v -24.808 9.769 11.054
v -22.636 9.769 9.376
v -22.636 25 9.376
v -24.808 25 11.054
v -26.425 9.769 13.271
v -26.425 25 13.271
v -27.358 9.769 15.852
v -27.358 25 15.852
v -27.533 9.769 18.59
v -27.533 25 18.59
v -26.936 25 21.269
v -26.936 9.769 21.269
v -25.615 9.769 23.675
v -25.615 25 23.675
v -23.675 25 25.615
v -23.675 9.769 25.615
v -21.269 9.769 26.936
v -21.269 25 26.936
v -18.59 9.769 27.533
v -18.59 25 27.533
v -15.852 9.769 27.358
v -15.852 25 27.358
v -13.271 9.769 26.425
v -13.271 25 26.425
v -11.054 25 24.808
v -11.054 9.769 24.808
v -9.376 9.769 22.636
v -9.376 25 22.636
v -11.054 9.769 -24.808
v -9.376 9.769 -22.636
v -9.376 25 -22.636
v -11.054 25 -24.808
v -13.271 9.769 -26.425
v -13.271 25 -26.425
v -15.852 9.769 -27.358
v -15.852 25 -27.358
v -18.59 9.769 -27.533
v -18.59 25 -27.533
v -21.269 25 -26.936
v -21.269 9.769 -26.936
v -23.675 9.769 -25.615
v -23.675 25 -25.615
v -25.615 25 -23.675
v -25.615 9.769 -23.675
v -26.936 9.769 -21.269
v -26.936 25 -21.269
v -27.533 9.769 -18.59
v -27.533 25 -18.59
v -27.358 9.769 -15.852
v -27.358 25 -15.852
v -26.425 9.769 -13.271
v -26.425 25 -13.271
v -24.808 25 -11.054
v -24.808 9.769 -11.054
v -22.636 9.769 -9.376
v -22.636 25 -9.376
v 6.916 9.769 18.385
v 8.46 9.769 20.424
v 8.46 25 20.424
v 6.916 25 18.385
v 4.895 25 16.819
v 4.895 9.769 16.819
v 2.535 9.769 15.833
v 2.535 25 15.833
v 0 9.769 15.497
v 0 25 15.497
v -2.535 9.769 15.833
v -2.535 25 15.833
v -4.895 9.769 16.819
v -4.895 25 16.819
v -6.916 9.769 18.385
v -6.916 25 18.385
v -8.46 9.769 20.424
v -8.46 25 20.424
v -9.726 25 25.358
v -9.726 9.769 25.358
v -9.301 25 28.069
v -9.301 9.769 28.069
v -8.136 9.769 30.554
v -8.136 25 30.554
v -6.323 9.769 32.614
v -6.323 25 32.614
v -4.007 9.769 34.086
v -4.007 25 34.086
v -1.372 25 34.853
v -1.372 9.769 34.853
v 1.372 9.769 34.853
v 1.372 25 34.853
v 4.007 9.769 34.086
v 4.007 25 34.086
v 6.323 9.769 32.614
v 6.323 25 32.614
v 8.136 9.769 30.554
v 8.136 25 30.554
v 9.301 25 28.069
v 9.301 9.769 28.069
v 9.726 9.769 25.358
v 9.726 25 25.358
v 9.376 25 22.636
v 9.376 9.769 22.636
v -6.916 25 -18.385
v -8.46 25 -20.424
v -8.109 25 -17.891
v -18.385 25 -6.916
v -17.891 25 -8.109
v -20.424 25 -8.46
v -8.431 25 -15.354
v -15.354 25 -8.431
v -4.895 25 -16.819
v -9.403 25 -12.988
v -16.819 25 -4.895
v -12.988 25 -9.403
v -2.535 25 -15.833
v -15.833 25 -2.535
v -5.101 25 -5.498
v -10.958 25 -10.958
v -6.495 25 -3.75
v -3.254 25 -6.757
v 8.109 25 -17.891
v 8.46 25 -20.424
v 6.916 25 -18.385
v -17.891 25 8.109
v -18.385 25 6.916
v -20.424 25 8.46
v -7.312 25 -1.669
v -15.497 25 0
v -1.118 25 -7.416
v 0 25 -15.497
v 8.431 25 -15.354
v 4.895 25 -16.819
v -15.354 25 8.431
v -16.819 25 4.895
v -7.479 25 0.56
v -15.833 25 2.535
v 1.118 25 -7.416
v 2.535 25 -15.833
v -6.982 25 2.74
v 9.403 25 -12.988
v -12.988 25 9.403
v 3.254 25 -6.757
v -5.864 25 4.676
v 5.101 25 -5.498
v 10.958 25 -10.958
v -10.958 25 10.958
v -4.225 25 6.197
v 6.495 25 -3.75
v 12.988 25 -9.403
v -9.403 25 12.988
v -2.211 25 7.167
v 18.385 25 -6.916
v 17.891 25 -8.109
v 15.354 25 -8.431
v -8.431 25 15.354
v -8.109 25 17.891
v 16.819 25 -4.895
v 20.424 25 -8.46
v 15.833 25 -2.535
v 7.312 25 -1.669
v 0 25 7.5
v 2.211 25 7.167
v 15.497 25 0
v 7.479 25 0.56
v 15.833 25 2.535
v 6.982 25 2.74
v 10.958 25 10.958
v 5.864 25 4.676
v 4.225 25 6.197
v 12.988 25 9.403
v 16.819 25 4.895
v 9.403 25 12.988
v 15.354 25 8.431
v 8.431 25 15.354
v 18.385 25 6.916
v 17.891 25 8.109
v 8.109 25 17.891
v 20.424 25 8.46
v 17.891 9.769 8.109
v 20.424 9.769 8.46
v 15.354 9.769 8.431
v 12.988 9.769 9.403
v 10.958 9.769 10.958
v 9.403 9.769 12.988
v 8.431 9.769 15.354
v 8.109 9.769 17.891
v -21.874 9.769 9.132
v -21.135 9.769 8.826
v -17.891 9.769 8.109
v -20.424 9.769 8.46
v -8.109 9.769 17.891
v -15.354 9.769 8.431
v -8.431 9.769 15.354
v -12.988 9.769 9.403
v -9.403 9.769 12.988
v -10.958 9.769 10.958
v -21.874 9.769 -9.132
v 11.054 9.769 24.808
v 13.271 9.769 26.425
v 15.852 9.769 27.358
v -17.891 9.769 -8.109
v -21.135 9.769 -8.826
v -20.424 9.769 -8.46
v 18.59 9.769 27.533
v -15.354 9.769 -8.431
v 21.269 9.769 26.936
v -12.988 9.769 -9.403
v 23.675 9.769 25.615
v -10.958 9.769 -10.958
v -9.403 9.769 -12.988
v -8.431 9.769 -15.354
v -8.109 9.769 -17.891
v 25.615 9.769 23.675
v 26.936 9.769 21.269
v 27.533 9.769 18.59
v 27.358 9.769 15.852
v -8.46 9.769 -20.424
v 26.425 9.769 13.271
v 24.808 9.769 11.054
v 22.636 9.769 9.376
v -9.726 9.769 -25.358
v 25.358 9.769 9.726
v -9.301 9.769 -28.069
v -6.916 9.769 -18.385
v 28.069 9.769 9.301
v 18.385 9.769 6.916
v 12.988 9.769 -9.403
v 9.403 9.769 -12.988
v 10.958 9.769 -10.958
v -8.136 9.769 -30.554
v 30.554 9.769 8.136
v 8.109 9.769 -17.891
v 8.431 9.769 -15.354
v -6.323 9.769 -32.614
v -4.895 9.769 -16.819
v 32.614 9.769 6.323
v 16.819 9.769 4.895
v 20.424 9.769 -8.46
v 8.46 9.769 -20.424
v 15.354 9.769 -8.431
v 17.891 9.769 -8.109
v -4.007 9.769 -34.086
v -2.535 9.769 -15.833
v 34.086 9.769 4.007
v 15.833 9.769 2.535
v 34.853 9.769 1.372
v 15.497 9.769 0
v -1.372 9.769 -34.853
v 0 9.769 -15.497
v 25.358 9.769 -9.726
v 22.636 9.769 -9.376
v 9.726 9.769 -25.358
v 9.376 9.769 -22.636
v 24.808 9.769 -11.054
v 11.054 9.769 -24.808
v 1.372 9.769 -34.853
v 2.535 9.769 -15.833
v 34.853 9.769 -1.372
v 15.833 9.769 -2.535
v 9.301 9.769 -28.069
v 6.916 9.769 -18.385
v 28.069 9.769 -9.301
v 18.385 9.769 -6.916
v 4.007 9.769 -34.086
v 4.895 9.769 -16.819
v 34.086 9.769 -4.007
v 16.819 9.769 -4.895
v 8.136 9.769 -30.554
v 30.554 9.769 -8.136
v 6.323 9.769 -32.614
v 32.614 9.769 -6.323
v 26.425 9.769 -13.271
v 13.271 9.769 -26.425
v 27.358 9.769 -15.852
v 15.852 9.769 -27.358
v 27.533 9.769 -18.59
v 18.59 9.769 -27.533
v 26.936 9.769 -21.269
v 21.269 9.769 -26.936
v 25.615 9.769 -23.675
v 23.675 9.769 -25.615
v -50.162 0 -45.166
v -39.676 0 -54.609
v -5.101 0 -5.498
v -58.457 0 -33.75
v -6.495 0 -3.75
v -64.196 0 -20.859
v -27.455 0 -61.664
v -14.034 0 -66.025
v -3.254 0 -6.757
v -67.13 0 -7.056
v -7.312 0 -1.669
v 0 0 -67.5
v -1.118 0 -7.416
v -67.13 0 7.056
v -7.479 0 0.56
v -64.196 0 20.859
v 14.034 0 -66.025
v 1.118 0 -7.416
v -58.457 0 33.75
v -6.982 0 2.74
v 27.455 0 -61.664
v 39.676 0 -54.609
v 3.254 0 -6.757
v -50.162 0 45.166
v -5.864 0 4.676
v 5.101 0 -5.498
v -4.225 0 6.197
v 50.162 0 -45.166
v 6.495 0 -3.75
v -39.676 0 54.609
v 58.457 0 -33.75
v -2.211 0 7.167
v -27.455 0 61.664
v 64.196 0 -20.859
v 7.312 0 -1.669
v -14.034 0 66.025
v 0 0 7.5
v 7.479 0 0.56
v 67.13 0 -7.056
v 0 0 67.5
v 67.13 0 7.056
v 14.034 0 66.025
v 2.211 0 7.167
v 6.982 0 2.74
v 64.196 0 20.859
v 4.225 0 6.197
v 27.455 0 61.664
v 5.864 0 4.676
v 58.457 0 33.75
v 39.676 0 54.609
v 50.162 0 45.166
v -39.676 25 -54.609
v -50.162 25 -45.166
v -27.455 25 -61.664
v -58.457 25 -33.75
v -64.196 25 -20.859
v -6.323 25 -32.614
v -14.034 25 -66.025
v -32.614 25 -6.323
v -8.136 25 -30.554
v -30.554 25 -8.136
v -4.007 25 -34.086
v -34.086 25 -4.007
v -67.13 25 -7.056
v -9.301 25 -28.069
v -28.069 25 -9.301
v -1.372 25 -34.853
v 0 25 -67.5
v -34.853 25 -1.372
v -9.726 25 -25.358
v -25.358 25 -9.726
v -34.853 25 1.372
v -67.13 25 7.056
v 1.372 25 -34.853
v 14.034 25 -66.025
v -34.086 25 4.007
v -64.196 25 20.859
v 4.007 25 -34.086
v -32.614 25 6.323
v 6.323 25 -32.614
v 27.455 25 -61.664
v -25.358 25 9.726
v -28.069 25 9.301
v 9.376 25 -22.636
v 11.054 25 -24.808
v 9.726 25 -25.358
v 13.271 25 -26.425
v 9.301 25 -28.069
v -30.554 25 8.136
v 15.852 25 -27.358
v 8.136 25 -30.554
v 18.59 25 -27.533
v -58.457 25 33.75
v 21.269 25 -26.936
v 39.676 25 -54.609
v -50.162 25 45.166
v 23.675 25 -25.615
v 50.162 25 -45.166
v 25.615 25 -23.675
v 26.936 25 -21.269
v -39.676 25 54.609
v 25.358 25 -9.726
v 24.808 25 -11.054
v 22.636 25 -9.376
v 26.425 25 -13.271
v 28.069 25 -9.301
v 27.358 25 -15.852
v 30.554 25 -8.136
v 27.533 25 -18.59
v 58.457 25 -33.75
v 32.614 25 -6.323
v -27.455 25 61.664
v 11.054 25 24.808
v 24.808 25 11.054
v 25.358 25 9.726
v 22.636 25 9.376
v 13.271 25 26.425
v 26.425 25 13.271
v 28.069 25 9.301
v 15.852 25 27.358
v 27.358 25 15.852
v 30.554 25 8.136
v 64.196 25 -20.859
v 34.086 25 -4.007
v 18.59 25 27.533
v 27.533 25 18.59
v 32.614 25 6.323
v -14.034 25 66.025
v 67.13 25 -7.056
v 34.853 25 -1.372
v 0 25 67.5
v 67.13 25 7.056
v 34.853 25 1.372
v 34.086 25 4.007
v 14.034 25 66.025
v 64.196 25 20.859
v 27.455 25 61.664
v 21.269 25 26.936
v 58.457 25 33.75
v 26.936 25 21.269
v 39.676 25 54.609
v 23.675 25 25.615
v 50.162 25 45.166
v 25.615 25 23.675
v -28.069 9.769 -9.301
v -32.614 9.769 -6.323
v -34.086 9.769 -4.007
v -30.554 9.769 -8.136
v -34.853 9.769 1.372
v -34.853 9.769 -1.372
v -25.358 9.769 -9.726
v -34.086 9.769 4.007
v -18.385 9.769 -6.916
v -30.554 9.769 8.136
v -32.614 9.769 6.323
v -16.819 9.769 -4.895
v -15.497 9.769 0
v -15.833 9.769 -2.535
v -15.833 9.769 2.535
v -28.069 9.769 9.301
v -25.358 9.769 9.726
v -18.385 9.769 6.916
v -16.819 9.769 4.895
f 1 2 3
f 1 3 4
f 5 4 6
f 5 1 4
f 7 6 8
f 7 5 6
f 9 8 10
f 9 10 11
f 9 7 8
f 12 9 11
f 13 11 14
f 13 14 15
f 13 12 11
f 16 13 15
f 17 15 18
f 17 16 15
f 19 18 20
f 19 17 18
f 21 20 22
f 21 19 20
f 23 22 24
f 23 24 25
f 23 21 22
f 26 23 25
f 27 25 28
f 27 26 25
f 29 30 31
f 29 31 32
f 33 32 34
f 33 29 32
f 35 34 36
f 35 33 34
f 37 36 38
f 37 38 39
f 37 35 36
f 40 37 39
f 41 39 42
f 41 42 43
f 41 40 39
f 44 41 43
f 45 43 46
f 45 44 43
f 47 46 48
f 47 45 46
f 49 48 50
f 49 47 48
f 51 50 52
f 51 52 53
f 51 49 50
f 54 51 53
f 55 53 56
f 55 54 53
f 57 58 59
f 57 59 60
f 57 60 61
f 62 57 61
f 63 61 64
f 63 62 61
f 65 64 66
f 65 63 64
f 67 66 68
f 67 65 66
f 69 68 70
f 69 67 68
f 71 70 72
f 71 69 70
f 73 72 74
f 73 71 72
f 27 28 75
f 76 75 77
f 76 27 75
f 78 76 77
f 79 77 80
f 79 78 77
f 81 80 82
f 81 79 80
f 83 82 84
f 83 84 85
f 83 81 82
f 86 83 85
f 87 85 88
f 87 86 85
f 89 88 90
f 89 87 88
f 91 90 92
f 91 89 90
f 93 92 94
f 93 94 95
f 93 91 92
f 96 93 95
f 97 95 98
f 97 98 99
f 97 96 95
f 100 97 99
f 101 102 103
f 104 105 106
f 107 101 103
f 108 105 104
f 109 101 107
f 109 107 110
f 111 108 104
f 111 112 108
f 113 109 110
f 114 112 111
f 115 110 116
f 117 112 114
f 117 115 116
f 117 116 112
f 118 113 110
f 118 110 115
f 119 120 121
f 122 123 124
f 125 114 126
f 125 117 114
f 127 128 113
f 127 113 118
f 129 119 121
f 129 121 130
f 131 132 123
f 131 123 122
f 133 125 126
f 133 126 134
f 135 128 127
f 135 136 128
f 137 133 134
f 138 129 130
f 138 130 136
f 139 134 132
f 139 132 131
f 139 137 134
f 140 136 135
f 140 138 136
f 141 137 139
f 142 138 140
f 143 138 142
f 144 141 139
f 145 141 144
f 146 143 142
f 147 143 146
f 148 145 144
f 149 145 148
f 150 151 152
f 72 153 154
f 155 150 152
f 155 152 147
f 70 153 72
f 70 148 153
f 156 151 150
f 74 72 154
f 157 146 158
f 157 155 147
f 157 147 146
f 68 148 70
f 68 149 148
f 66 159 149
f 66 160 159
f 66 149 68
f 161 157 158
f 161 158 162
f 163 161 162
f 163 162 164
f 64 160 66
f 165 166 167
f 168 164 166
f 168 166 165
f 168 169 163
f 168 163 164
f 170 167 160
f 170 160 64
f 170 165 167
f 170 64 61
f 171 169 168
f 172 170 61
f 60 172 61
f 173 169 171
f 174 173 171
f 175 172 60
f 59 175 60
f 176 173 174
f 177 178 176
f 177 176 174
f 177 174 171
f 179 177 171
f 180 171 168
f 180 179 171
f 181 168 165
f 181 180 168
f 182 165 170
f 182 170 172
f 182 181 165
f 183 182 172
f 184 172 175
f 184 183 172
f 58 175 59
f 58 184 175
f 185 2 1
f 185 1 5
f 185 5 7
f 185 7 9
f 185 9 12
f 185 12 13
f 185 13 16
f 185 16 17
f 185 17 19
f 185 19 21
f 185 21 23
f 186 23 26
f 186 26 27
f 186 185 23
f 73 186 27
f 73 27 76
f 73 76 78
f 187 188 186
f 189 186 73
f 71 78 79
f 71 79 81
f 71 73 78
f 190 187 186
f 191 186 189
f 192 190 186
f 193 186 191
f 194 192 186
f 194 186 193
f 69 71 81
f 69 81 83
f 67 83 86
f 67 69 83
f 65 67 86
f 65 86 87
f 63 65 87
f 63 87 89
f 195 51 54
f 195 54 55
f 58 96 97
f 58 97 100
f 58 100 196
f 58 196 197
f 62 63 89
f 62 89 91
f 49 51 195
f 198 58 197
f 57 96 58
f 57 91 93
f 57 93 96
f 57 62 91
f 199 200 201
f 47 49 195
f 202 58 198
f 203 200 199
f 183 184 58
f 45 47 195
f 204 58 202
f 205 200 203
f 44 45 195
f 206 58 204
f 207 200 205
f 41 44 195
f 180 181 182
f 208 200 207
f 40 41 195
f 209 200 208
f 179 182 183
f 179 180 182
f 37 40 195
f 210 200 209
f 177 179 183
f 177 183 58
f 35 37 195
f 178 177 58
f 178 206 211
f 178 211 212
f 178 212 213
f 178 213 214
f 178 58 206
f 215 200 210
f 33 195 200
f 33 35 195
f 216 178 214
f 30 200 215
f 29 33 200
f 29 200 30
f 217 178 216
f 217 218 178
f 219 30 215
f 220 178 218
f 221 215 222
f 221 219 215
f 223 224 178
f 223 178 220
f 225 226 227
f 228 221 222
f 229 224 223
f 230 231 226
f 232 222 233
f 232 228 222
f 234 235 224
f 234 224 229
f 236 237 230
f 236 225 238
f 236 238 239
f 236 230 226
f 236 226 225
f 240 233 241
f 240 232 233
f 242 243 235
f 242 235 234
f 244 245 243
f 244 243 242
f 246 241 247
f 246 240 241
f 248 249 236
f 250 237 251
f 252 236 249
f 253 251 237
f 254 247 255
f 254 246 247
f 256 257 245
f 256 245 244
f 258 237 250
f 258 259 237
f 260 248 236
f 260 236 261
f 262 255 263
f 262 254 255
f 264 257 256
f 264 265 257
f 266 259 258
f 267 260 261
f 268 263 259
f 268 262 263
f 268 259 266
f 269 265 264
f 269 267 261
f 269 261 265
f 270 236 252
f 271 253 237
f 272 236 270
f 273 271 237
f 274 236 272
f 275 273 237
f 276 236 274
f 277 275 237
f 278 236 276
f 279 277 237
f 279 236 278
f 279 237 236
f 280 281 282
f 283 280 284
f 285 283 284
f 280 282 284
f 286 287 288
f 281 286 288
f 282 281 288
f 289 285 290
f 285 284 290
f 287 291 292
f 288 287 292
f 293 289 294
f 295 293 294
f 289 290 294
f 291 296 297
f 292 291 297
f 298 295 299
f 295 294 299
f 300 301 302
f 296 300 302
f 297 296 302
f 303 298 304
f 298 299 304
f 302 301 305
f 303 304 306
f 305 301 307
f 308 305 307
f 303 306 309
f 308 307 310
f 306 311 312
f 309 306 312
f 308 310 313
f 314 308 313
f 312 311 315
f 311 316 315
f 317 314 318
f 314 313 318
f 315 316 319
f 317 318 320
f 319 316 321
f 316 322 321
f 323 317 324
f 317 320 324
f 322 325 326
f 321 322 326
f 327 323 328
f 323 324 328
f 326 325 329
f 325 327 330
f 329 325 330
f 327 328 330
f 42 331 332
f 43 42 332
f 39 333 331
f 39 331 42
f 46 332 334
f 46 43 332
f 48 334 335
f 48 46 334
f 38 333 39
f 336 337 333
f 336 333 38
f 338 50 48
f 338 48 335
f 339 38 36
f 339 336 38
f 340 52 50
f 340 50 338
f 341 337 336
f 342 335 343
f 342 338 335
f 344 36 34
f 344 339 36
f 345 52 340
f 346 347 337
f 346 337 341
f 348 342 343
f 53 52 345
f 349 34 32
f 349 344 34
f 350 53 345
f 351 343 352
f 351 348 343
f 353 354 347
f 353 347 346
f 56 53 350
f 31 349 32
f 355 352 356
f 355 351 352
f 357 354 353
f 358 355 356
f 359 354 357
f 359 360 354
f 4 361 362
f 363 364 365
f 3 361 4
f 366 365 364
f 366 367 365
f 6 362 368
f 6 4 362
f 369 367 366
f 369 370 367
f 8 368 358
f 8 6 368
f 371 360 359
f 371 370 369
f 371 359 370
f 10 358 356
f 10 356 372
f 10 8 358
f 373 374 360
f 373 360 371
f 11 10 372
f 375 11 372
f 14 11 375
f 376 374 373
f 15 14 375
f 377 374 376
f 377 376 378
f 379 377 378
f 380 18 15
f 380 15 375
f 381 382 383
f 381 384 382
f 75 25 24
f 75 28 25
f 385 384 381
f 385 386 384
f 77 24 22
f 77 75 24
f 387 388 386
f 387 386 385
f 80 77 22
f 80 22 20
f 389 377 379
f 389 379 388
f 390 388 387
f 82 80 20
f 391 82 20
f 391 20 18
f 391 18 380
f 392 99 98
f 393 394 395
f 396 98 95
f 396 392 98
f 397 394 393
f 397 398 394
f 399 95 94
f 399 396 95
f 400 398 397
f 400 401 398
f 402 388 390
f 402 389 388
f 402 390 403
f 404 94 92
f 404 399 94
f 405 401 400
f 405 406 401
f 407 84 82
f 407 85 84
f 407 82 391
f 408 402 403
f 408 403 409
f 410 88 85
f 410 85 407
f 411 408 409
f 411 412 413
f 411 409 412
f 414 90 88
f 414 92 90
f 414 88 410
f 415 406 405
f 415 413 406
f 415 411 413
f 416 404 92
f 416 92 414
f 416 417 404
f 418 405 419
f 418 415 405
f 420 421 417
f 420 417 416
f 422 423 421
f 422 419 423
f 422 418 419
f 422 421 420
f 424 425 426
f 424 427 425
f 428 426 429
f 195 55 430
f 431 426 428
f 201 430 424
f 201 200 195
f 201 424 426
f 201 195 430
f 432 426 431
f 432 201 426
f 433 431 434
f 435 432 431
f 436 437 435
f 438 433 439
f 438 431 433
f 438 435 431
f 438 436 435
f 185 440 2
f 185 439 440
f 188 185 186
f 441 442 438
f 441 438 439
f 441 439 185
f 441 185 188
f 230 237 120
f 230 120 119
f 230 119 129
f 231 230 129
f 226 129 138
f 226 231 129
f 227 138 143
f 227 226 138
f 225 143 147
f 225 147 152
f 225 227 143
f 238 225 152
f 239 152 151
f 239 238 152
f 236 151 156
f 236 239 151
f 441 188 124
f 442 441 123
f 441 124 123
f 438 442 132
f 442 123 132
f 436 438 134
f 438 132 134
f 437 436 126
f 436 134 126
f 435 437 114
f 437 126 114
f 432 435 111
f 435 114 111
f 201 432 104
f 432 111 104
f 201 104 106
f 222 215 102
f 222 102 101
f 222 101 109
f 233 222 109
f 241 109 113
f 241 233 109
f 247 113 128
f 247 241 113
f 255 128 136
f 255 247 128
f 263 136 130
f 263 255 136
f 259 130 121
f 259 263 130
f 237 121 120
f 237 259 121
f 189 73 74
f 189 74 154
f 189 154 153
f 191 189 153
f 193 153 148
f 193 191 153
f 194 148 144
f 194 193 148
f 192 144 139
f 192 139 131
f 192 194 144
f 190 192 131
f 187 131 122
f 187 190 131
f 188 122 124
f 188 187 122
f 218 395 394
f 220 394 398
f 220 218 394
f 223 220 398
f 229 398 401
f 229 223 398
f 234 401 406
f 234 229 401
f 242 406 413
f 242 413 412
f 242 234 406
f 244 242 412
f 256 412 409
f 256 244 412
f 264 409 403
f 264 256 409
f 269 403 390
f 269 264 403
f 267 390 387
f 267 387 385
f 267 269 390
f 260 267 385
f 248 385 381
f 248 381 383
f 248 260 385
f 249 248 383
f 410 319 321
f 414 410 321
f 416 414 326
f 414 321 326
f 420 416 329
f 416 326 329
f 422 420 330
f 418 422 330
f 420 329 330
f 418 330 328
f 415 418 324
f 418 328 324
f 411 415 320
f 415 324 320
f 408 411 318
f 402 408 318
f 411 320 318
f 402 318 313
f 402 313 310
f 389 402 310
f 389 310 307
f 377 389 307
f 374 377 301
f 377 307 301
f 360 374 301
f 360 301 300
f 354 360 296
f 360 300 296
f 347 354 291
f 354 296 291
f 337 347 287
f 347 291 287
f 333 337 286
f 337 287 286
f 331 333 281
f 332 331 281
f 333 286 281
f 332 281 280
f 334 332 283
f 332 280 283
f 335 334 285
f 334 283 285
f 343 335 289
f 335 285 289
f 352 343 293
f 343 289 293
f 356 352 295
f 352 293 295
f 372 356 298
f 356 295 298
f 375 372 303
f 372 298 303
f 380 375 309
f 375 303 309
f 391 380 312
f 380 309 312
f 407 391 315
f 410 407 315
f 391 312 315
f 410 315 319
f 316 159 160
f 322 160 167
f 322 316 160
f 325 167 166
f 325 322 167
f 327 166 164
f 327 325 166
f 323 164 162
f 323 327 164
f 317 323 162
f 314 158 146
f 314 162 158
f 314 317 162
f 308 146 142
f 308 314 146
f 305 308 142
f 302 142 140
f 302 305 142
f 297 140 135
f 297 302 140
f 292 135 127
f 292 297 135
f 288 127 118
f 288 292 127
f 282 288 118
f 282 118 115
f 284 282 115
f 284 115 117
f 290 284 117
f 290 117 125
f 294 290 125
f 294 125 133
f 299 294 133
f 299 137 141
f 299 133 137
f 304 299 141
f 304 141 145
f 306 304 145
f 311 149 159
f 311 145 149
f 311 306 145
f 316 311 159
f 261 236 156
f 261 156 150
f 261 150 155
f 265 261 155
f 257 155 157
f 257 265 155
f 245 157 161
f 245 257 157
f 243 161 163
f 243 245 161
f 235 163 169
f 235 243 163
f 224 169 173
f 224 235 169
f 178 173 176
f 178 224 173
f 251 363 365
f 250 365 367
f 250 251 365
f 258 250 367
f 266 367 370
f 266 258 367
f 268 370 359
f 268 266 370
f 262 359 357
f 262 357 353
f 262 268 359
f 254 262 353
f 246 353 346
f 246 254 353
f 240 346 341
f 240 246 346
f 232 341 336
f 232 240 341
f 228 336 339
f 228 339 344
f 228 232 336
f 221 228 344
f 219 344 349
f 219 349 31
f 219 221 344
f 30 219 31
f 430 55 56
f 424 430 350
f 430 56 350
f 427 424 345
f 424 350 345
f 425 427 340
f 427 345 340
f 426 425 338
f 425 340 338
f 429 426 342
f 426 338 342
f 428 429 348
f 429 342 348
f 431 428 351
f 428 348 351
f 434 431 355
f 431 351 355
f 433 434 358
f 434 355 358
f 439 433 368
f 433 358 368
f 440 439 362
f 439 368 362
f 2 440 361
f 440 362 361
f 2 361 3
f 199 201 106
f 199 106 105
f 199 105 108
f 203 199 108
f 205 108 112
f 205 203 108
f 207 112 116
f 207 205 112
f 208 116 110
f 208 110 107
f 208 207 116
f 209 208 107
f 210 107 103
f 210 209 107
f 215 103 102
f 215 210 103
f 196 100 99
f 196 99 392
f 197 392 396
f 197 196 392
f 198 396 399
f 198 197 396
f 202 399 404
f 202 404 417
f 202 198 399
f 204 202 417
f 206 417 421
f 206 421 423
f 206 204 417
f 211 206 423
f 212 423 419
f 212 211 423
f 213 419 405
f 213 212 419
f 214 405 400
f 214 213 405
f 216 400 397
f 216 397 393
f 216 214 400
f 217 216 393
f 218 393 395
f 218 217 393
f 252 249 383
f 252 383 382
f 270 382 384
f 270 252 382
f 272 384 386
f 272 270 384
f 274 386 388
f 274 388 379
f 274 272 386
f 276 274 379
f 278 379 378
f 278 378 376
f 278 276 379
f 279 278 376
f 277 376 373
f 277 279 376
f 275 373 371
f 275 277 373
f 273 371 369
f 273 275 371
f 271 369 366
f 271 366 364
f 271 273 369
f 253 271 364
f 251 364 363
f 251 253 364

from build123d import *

# Parameters (mm, degrees)
SKETCH1_R           = 67.5
BOSS_EXTRUDE1_DEPTH = 25
SKETCH2_R           = 7.5
CUT_EXTRUDE1_DEPTH  = 99.67877178
SKETCH3_R           = 9.726631354
CUT_EXTRUDE2_DEPTH  = 15.23068031
CIRPATTERN1_COUNT   = 8


with BuildPart() as part:
    # Sketch1 → Boss-Extrude1 (new body)
    with BuildSketch(Plane(origin=(0, 0, 0), x_dir=(1, 0, 0), z_dir=(0, 1, 0))):
        Circle(SKETCH1_R)
    extrude(amount=BOSS_EXTRUDE1_DEPTH)

    # Sketch2 → Cut-Extrude1 (cut, through all)
    with BuildSketch(Plane(origin=(0, 0, 0), x_dir=(1, 0, 0), z_dir=(0, 1, 0))):
        Circle(SKETCH2_R)
    extrude(amount=CUT_EXTRUDE1_DEPTH, mode=Mode.SUBTRACT)

    # Sketch3 → Cut-Extrude2 (cut)
    with BuildSketch(Plane(origin=(0, 25, 0), x_dir=(1, 0, 0), z_dir=(0, 1, 0))):
        with Locations((-25.223681721, 0)):
            Circle(SKETCH3_R)
    cut_extrude2 = extrude(amount=-CUT_EXTRUDE2_DEPTH, mode=Mode.SUBTRACT)

    # CirPattern1: Cut-Extrude2 ×8 about axis
    cirpattern1_axis = Axis((0, 0, 0), (0, 1, 0))
    for i in range(1, CIRPATTERN1_COUNT):
        add(cut_extrude2.rotate(cirpattern1_axis, i * 360 / CIRPATTERN1_COUNT), mode=Mode.SUBTRACT)


solid = part.part
